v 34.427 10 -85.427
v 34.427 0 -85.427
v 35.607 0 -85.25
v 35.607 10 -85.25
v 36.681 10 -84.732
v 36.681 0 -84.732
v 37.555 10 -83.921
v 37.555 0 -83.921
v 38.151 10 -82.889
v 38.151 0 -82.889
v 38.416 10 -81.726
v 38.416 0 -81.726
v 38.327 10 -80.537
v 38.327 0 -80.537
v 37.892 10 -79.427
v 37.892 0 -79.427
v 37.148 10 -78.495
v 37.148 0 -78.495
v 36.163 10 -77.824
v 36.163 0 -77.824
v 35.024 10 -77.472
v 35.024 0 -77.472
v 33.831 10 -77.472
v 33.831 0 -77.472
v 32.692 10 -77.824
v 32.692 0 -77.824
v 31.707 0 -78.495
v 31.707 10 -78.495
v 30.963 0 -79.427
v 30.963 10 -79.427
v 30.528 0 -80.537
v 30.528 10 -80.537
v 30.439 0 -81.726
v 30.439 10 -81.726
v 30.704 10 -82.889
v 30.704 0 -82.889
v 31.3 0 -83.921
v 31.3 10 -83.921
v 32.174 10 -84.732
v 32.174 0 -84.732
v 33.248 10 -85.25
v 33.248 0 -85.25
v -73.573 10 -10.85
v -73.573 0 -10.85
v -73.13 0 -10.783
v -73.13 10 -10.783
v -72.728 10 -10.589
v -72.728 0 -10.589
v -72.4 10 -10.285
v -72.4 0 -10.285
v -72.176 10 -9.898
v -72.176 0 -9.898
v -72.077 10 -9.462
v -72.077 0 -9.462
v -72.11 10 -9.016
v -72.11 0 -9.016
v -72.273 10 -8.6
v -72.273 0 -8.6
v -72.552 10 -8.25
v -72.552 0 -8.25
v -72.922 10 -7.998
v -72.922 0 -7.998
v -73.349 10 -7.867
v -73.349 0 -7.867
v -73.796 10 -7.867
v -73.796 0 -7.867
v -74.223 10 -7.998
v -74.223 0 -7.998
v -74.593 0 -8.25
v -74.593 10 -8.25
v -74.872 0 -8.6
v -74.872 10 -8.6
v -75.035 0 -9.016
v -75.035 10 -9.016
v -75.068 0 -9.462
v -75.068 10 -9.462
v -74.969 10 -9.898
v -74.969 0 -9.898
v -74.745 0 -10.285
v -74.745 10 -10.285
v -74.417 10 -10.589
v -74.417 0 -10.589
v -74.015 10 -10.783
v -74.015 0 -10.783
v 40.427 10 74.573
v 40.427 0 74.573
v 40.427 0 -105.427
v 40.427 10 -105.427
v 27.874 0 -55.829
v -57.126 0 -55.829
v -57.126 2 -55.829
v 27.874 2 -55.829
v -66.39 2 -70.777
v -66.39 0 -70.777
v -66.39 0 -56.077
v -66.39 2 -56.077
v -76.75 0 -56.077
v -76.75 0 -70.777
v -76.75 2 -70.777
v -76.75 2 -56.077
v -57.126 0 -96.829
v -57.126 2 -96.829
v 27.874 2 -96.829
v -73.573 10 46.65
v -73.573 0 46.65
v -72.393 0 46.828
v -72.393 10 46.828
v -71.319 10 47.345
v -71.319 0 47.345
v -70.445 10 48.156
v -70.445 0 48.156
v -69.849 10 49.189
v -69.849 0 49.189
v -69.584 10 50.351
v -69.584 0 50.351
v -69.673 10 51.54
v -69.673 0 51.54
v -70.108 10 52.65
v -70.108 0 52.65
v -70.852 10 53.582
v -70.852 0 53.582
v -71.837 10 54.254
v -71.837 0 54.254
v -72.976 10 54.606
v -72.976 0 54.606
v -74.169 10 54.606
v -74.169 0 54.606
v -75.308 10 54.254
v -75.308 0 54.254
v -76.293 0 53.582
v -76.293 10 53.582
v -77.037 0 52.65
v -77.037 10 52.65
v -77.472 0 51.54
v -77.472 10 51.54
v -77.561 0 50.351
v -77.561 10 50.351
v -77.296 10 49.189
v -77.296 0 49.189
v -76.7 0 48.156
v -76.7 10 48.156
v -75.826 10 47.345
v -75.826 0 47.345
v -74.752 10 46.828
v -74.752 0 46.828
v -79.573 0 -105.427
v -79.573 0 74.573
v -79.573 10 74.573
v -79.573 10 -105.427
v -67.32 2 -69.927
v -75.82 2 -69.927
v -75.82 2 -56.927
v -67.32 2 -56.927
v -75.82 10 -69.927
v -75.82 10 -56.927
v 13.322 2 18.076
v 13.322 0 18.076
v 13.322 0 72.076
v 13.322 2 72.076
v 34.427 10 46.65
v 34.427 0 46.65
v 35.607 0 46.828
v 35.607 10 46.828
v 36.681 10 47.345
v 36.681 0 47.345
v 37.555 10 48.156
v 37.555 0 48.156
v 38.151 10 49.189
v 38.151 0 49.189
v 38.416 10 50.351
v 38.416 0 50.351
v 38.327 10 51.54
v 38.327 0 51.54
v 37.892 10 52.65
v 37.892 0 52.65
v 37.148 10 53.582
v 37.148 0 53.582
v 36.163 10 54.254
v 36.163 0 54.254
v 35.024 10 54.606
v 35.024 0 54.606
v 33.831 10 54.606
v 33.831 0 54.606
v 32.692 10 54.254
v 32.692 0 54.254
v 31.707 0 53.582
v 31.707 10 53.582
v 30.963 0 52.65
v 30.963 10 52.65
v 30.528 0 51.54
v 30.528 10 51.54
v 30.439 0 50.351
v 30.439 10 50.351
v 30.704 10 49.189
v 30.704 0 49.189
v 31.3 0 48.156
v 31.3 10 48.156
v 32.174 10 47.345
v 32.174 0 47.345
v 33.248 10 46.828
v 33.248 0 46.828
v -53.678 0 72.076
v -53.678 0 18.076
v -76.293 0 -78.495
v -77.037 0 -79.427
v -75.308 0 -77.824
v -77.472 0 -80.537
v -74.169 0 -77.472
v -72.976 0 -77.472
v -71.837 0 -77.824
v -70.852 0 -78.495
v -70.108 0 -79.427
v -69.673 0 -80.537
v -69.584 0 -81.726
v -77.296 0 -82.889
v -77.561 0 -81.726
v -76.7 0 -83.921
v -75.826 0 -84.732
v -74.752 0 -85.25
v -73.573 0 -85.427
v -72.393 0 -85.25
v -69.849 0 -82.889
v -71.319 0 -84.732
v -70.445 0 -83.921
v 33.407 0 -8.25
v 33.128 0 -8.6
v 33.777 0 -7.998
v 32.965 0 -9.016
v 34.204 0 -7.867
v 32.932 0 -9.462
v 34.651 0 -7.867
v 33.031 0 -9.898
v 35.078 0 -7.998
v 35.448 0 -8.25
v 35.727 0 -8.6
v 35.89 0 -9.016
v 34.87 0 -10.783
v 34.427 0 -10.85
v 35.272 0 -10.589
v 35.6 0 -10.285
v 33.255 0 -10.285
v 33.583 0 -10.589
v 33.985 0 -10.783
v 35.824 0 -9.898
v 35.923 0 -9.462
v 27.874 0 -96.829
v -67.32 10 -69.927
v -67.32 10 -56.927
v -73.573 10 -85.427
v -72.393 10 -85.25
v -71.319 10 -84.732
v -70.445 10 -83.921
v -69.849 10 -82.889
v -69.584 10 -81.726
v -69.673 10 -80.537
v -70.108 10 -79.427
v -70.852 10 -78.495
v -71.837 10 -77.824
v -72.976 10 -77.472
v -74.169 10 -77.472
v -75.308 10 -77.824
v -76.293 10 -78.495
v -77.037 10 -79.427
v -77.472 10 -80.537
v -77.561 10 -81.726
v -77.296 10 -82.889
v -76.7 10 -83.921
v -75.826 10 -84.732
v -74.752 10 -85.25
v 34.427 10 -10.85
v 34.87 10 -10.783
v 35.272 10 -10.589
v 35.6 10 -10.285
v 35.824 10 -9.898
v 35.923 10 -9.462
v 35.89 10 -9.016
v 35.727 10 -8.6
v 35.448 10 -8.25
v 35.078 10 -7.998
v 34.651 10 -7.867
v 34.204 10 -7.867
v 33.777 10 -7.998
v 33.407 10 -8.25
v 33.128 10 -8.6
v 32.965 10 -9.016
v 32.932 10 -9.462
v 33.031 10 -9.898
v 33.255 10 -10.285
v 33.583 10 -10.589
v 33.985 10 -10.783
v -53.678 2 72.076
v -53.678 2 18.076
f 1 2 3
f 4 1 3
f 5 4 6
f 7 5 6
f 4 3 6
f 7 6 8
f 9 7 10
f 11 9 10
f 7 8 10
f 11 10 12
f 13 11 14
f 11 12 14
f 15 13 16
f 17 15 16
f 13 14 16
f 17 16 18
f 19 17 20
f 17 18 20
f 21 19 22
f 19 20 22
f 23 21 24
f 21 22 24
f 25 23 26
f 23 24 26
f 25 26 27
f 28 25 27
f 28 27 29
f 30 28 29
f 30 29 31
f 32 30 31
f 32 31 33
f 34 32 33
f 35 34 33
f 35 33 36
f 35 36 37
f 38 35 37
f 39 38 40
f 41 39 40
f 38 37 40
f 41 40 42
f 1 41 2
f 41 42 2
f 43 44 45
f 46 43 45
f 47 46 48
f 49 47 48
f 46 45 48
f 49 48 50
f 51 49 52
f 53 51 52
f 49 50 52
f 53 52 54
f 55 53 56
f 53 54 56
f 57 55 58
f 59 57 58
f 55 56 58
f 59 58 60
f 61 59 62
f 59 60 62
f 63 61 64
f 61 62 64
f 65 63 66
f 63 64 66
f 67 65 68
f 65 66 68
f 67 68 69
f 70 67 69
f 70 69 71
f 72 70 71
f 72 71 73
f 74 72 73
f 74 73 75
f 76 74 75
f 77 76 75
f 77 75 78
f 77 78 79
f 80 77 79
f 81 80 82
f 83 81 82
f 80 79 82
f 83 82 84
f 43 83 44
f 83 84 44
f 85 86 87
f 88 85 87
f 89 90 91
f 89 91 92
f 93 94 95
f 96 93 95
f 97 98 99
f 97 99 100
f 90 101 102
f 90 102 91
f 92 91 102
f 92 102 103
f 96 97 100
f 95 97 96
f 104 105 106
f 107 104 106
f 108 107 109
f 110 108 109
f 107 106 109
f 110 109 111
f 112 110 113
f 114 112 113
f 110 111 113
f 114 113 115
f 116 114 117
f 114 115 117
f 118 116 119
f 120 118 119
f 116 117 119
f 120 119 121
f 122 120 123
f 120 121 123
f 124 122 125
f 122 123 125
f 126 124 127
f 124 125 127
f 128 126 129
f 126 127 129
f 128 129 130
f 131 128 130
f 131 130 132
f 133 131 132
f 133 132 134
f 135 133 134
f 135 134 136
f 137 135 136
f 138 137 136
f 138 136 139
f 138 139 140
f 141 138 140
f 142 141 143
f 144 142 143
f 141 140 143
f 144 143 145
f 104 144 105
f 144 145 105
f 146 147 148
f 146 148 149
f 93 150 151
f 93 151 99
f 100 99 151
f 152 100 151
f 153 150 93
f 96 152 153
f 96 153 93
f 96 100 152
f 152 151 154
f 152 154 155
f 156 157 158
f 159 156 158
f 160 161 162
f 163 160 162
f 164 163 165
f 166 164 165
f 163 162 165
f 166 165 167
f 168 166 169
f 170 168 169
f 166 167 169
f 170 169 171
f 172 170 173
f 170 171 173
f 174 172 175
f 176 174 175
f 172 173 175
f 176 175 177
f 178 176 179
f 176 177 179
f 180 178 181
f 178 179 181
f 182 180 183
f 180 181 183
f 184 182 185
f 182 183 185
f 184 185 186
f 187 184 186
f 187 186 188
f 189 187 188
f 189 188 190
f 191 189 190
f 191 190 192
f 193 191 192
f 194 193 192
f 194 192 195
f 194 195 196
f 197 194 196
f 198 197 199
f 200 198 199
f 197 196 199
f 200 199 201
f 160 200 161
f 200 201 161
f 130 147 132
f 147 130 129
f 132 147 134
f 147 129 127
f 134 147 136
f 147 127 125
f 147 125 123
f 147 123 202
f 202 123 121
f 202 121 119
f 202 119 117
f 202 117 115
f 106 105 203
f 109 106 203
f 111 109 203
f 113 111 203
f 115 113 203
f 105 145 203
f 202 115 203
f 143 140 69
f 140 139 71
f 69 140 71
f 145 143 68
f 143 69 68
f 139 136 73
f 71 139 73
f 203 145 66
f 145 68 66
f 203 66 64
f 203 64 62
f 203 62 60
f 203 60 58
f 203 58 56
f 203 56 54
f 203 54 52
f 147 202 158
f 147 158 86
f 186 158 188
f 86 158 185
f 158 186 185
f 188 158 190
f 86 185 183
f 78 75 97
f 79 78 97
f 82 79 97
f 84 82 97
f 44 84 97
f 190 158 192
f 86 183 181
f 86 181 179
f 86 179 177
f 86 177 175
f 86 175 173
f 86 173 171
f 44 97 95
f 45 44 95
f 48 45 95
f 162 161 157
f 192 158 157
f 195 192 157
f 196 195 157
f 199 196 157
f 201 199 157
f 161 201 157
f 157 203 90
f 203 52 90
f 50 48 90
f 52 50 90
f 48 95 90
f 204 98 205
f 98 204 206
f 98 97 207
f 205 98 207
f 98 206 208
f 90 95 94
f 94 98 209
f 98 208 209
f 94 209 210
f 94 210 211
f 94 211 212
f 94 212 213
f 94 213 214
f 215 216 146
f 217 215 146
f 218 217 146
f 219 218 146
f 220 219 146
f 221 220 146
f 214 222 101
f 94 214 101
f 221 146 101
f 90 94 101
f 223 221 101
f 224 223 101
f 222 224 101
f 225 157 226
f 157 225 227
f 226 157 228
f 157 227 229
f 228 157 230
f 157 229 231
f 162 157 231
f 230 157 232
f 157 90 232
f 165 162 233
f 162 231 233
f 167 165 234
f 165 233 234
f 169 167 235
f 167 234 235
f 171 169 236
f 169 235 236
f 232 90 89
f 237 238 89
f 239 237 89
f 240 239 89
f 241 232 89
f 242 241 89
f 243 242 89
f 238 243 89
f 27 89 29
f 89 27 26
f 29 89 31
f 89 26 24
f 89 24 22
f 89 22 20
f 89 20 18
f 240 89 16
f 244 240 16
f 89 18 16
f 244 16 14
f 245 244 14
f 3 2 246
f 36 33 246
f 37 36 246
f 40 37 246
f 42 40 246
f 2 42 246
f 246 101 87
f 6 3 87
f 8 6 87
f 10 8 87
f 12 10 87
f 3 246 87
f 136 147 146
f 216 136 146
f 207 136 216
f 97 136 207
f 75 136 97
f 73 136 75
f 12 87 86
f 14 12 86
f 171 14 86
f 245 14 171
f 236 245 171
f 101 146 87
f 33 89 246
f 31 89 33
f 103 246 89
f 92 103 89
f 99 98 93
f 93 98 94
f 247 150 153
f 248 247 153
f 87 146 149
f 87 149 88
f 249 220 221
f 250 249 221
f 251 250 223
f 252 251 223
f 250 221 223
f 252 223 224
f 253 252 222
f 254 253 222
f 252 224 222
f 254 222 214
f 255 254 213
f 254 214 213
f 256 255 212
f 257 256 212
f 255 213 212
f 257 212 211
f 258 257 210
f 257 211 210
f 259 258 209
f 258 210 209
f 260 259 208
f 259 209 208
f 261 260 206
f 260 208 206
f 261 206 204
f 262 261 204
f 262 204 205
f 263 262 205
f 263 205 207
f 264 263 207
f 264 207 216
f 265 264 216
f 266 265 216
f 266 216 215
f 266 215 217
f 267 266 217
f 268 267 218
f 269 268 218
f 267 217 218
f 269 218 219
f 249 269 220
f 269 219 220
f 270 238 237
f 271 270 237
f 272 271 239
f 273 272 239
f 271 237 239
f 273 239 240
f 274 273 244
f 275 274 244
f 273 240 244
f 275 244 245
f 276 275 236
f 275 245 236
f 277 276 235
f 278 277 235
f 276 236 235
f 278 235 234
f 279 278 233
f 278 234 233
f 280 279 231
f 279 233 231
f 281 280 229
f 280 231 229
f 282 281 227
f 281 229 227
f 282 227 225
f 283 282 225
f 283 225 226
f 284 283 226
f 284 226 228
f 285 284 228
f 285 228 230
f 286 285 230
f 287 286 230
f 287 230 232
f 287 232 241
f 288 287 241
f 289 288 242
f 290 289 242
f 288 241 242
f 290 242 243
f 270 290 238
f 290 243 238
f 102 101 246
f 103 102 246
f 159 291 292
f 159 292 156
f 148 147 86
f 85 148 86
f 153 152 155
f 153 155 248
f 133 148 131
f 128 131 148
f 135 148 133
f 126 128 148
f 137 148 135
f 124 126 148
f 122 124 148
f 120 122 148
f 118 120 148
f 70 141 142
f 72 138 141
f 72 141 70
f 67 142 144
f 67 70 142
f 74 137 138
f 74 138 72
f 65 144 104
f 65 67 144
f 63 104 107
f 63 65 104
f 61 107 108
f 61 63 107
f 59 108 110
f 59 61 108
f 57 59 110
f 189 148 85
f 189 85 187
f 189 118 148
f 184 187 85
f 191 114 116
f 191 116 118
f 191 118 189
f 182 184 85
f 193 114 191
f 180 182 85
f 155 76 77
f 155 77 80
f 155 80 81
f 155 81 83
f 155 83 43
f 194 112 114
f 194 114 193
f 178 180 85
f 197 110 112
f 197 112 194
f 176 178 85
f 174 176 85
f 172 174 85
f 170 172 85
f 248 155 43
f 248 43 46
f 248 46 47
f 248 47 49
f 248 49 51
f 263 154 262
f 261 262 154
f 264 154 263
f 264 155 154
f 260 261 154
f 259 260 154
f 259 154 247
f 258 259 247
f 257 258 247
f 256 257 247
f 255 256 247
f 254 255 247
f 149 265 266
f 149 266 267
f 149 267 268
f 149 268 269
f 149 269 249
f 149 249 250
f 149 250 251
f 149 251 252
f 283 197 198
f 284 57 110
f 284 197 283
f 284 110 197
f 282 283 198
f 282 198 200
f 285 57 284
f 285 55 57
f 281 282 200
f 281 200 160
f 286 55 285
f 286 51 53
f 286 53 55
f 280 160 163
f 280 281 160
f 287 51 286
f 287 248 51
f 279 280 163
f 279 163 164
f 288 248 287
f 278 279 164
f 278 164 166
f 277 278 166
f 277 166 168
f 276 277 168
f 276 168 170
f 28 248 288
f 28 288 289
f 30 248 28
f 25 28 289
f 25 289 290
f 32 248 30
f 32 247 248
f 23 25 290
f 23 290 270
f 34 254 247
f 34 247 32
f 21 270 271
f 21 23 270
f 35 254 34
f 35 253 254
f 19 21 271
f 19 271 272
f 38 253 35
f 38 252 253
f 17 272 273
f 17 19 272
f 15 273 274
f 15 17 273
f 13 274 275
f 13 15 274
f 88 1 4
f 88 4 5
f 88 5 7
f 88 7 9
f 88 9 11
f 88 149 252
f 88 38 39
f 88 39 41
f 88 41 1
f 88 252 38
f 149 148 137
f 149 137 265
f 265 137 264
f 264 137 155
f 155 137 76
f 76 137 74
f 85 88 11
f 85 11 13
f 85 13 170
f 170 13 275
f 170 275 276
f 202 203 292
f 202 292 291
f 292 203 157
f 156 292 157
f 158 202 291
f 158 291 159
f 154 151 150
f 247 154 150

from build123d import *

# Parameters (mm, degrees)
SKETCH1_W           = 120
SKETCH1_H           = 180
BOSS_EXTRUDE1_DEPTH = 10
SKETCH2_R           = 4
SKETCH2_R_2         = 1.5
CUT_EXTRUDE1_DEPTH  = 10
SKETCH3_W           = 67
SKETCH3_H           = 54
SKETCH3_W_2         = 85
SKETCH3_H_2         = 41
SKETCH3_W_3         = 10.36
SKETCH3_H_3         = 14.7
CUT_EXTRUDE2_DEPTH  = 2
SKETCH4_W           = 8.5
SKETCH4_H           = 13
CUT_EXTRUDE3_DEPTH  = 10


with BuildPart() as part:
    # Sketch1 → Boss-Extrude1 (new body)
    with BuildSketch(Plane(origin=(0, 0, 0), x_dir=(1, 0, 0), z_dir=(0, 1, 0))):
        with Locations((-19.57251684, 15.427483158)):
            Rectangle(SKETCH1_W, SKETCH1_H)
    extrude(amount=BOSS_EXTRUDE1_DEPTH)

    # Sketch2 → Cut-Extrude1 (cut)
    with BuildSketch(Plane.XZ):
        with Locations(Location((-73.57251684, 50.65020927, 0), (0, 0, 270))):
            Circle(SKETCH2_R)
        with Locations(Location((34.42748316, 50.65020927, 0), (0, 0, 270))):
            Circle(SKETCH2_R)
        with Locations(Location((34.42748316, -81.427483158, 0), (0, 0, 270))):
            Circle(SKETCH2_R)
        with Locations(Location((-73.57251684, -81.427483158, 0), (0, 0, 270))):
            Circle(SKETCH2_R)
        with Locations(Location((-73.57251684, -9.34979073, 0), (0, 0, 270))):
            Circle(SKETCH2_R_2)
        with Locations(Location((34.42748316, -9.34979073, 0), (0, 0, 270))):
            Circle(SKETCH2_R_2)
    extrude(amount=-CUT_EXTRUDE1_DEPTH, mode=Mode.SUBTRACT)

    # Sketch3 → Cut-Extrude2 (cut)
    with BuildSketch(Plane.XZ):
        with Locations((-20.178258513, 45.076374251)):
            Rectangle(SKETCH3_W, SKETCH3_H)
        with Locations((-14.626073682, -76.328520248)):
            Rectangle(SKETCH3_W_2, SKETCH3_H_2)
        with Locations((-71.569507279, -63.427483158)):
            Rectangle(SKETCH3_W_3, SKETCH3_H_3)
    extrude(amount=-CUT_EXTRUDE2_DEPTH, mode=Mode.SUBTRACT)

    # Sketch4 → Cut-Extrude3 (cut)
    with BuildSketch(Plane.XZ):
        with Locations((-71.569507279, -63.427483158)):
            Rectangle(SKETCH4_W, SKETCH4_H)
    extrude(amount=-CUT_EXTRUDE3_DEPTH, mode=Mode.SUBTRACT)


solid = part.part
